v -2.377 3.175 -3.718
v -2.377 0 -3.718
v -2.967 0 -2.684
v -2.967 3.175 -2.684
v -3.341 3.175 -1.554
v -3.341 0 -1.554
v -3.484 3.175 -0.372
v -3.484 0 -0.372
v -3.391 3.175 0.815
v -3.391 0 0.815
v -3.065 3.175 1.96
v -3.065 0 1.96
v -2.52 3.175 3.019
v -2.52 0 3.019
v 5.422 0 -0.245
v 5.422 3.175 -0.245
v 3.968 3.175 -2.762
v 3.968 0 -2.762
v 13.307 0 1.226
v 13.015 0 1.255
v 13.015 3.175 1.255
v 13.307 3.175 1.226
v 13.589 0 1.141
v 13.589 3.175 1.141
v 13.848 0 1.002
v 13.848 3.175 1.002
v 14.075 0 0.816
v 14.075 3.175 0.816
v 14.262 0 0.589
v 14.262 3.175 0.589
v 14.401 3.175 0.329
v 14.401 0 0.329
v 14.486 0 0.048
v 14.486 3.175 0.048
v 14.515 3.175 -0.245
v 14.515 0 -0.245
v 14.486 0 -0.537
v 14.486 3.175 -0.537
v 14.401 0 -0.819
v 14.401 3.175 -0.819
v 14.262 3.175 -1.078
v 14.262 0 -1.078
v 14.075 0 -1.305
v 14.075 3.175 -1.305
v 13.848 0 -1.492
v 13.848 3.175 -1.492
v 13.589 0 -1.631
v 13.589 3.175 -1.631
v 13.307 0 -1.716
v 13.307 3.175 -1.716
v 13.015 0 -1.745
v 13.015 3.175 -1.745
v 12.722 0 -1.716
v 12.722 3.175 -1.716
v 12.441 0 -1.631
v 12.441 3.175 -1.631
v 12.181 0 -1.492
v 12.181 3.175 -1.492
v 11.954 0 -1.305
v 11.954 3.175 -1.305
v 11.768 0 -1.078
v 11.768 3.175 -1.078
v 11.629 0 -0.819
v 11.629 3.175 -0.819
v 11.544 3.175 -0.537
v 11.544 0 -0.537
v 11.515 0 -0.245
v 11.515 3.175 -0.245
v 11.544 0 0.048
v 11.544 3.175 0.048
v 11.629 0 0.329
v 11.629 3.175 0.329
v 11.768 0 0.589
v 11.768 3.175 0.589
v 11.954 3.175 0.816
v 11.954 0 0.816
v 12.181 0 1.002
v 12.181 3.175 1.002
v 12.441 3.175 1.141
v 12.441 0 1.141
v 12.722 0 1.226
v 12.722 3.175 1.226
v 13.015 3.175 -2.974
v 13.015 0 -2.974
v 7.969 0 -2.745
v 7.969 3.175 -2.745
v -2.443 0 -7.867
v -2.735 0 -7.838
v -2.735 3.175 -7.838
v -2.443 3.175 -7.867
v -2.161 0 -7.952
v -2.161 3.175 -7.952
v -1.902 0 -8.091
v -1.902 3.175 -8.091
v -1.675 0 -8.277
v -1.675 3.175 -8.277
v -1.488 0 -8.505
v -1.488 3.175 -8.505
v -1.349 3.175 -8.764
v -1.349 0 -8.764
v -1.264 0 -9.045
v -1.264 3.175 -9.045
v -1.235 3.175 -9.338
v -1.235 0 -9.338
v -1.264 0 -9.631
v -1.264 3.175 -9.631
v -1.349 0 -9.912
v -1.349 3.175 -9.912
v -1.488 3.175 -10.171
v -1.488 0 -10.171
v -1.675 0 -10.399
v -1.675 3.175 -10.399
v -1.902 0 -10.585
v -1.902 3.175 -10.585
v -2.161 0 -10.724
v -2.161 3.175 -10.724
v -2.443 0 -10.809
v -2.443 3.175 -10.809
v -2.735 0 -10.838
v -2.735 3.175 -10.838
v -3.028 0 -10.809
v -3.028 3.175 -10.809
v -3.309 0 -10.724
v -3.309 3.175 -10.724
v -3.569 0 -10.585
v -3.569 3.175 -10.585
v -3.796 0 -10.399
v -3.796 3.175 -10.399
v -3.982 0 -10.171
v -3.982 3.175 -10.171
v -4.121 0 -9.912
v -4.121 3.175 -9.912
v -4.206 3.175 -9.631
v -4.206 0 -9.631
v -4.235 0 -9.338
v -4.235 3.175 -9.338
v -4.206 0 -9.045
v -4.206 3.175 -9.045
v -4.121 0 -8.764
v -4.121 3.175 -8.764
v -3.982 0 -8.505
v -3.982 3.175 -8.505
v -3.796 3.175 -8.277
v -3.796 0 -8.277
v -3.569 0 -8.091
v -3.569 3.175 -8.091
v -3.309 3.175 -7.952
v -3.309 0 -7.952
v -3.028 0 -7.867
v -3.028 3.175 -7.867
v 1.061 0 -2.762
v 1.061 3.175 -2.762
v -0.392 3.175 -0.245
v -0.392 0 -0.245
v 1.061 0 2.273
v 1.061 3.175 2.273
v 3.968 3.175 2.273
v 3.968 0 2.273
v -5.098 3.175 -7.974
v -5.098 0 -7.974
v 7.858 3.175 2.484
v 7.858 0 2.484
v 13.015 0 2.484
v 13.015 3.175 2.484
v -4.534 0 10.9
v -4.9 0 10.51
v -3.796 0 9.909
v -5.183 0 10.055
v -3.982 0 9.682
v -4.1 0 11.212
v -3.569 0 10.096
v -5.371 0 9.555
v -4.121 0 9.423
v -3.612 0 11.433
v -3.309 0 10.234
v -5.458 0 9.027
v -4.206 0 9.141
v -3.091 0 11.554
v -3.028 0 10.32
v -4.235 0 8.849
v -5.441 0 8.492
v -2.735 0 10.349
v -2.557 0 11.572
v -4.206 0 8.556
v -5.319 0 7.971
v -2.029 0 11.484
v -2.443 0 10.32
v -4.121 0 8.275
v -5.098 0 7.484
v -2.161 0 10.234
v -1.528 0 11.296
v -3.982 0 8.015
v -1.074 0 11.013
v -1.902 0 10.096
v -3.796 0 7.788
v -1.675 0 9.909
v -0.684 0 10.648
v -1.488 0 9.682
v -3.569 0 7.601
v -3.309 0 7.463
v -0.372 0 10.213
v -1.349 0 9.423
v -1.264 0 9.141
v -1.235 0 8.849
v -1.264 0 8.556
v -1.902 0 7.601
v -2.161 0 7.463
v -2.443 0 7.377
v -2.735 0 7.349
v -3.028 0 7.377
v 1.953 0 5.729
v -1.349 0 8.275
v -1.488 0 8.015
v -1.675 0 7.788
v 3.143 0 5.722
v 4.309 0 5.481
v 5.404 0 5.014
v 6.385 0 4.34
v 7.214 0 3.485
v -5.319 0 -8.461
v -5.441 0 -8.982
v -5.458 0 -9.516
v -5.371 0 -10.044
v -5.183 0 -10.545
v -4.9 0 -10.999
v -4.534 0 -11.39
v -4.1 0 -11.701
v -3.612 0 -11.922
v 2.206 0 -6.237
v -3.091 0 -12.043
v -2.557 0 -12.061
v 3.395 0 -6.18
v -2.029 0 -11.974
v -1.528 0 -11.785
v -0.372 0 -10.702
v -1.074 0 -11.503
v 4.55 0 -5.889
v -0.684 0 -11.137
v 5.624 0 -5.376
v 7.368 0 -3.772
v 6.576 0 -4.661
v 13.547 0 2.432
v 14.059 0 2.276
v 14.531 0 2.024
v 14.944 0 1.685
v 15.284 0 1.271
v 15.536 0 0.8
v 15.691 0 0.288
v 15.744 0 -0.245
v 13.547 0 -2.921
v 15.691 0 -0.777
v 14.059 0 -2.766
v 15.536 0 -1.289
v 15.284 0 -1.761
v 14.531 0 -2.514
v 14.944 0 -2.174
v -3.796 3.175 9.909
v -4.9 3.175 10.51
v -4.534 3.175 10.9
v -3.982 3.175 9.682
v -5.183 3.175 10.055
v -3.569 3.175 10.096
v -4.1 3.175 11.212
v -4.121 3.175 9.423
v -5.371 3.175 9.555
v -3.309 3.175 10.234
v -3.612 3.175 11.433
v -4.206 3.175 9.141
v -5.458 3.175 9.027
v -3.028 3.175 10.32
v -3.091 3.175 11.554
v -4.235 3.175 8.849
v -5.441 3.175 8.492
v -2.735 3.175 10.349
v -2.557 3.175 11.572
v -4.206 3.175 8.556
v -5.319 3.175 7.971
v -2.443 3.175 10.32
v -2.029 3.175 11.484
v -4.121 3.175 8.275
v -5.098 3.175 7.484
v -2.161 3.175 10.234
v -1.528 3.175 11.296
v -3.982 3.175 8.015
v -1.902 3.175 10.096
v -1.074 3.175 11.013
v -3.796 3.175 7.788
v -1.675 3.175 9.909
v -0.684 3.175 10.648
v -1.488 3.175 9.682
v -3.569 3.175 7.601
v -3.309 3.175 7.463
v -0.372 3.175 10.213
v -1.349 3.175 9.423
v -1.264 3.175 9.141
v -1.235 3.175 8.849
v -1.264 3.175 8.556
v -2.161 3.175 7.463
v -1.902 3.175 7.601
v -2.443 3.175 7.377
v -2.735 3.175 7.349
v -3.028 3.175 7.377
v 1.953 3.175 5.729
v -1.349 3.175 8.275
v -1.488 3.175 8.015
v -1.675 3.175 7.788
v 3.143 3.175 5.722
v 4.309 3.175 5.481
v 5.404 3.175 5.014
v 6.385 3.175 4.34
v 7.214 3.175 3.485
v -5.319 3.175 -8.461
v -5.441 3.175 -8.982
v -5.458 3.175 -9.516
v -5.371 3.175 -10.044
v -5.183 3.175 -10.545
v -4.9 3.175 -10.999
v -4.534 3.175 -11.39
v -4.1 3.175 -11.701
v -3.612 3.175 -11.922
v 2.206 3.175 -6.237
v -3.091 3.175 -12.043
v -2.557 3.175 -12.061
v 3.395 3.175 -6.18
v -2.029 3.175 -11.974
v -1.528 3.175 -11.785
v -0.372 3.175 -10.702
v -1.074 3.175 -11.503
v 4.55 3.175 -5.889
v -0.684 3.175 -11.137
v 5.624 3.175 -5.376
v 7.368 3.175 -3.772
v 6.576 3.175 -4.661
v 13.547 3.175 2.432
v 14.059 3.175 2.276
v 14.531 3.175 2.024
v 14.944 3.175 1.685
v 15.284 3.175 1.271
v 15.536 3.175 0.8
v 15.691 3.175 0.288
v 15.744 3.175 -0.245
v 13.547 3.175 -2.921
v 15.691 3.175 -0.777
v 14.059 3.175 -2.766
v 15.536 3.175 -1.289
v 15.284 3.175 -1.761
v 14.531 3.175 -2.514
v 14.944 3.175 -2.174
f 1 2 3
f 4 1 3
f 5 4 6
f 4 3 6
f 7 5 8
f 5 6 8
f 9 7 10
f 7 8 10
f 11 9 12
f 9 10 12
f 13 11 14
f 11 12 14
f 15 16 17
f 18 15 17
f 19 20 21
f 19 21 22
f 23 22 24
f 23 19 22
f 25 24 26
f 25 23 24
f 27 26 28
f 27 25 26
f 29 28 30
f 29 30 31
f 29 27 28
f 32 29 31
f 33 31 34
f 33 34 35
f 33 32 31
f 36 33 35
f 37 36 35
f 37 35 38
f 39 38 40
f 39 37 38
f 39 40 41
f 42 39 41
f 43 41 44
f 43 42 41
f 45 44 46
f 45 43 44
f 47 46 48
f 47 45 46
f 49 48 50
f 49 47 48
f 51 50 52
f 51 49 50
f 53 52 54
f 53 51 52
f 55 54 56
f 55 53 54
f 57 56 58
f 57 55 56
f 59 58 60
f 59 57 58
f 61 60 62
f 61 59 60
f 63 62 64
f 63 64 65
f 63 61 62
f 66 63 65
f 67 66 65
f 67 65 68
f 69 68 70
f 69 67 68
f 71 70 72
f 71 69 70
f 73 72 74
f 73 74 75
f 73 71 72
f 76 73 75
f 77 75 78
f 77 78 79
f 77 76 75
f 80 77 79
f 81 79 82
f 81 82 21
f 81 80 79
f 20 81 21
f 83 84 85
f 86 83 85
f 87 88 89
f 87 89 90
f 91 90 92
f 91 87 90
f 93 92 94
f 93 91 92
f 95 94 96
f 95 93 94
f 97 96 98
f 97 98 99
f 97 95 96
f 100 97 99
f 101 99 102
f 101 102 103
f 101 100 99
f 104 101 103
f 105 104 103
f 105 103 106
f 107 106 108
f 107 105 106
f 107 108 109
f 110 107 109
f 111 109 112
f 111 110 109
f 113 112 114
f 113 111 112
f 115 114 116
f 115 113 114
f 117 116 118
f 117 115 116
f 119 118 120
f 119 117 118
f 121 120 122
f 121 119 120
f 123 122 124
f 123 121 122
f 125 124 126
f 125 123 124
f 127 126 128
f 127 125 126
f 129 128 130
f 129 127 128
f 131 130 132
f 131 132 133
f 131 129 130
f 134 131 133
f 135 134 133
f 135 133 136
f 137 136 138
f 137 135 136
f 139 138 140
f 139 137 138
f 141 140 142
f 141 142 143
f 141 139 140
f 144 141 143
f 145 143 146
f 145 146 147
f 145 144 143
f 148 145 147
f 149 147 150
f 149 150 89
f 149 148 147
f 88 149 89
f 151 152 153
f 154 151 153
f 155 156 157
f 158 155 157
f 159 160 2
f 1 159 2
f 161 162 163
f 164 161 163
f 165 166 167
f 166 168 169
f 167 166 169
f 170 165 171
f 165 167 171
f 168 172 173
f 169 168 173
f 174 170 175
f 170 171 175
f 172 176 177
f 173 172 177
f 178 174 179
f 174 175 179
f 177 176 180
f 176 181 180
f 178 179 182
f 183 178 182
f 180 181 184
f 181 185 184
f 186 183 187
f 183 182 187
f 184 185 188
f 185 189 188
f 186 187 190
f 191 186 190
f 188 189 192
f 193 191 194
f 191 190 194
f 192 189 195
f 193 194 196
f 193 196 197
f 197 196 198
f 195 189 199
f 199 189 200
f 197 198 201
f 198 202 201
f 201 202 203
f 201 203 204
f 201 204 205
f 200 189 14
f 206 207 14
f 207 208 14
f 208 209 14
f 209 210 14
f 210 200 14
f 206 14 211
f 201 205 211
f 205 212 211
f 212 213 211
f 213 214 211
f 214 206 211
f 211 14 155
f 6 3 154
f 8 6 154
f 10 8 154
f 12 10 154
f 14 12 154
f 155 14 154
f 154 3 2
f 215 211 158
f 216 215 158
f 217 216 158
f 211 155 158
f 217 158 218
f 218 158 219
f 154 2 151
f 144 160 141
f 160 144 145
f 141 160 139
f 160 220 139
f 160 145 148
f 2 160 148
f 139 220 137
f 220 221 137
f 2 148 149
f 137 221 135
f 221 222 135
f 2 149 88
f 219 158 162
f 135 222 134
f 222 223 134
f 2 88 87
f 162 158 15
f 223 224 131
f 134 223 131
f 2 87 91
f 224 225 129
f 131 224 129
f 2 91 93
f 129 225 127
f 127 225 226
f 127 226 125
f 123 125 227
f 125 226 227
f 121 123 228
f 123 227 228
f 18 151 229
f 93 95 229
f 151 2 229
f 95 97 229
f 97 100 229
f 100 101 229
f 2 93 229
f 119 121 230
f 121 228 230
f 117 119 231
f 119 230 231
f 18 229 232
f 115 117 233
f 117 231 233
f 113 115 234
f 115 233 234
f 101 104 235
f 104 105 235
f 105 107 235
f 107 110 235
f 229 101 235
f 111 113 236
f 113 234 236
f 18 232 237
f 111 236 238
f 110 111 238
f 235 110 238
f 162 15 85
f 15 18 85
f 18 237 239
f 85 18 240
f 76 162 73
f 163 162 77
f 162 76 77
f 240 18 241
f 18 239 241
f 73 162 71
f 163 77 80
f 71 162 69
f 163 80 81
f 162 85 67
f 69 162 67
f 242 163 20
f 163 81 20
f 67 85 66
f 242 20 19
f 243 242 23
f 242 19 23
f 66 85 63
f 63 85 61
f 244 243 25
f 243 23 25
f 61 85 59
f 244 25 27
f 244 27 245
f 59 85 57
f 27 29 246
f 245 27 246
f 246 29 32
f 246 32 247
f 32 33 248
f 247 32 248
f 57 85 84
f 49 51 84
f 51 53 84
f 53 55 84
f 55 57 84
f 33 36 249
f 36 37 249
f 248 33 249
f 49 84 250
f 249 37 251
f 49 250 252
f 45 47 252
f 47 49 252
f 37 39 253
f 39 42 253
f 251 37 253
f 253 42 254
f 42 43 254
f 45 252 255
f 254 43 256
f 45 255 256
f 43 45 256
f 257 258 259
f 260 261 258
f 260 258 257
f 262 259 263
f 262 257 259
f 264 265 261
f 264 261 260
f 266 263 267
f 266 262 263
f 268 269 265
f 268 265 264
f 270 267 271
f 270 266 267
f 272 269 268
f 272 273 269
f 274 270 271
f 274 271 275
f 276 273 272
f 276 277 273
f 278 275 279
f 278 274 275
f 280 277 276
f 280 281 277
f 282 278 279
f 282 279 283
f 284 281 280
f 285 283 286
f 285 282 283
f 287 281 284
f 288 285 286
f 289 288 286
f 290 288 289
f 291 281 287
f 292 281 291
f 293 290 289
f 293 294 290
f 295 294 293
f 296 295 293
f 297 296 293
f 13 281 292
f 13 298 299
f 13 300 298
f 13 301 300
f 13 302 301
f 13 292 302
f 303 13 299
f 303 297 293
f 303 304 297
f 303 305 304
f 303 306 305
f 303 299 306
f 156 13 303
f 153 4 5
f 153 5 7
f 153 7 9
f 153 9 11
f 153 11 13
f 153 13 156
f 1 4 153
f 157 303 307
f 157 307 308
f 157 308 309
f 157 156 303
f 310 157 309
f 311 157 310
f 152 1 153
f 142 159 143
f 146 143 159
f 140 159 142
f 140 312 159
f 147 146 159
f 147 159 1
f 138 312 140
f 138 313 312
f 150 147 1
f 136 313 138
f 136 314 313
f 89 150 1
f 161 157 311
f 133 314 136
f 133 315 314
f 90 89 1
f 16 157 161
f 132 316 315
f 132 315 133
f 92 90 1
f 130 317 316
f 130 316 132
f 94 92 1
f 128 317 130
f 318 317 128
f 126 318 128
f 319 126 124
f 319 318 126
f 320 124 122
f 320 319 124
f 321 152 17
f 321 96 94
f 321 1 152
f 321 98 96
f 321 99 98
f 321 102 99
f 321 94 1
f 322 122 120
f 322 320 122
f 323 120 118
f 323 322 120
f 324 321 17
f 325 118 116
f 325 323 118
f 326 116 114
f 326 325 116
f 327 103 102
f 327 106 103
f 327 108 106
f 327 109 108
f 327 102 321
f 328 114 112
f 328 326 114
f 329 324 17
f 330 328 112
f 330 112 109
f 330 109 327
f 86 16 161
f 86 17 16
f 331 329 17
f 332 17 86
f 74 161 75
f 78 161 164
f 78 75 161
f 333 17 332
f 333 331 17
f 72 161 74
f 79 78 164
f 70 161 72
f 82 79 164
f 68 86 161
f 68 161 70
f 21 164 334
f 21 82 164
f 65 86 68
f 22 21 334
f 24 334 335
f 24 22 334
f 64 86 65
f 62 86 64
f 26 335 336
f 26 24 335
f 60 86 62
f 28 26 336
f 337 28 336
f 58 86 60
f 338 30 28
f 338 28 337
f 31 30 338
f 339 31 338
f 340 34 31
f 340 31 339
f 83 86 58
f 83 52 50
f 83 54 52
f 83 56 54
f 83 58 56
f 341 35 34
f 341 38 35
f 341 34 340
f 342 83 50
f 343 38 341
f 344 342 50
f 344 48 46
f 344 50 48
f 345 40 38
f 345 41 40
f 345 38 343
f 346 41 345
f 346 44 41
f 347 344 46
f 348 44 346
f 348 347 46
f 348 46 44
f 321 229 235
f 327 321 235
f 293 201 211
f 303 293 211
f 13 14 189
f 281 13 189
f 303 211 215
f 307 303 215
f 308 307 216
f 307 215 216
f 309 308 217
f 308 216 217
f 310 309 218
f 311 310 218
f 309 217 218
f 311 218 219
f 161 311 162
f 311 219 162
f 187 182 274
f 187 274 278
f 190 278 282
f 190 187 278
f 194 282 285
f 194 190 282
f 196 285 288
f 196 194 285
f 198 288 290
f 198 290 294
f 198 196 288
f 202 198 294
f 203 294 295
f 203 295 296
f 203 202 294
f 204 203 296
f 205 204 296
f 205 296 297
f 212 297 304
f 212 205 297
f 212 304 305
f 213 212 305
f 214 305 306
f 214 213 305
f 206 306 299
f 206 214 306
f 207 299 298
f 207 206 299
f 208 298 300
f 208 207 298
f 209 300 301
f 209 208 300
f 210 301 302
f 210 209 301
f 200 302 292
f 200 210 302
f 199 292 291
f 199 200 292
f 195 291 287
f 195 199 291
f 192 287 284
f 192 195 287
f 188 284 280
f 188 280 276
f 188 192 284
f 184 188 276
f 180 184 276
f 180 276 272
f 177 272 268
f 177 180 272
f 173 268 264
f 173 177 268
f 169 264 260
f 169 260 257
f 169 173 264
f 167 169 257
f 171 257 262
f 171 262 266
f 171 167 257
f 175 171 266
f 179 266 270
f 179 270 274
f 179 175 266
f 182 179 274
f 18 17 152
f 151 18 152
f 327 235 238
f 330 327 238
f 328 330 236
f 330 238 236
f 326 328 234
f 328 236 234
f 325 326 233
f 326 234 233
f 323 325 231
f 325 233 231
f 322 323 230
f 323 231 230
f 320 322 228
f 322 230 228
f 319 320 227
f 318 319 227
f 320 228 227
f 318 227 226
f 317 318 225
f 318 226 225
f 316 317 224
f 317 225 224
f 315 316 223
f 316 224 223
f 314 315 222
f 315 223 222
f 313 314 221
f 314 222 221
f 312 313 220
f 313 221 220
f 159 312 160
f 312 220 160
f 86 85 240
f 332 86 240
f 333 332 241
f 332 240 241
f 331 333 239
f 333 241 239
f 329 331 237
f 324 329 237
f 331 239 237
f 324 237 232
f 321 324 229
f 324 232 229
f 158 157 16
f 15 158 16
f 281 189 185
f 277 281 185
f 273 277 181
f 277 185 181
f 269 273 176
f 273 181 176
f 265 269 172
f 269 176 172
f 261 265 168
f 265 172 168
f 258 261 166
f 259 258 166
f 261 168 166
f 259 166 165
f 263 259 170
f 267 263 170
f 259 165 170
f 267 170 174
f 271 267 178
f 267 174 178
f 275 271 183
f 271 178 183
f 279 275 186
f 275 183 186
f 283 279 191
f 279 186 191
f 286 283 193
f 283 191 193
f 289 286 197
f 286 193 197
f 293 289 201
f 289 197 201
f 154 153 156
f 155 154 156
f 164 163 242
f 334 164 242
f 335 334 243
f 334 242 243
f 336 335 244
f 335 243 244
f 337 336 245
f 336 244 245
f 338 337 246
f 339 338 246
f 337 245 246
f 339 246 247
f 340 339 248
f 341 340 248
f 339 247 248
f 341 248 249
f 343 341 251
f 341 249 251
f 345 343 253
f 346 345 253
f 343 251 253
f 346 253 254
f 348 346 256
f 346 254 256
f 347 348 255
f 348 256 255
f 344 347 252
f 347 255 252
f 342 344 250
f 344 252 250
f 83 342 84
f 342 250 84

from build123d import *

# Parameters (mm, degrees)
SKETCH1_R           = 1.5
BOSS_EXTRUDE1_DEPTH = 3.175
CUT_EXTRUDE1_DEPTH  = 10


with BuildPart() as part:
    # Sketch1 → Boss-Extrude1 (new body)
    with BuildSketch(Plane(origin=(0, 0, 0), x_dir=(1, 0, 0), z_dir=(0, 1, 0))):
        with BuildLine():
            Line((7.858300919, -2.484134681), (13.014762042, -2.484134681))
            ThreePointArc((13.014762042, -2.484134681), (15.743606535, 0.244709812), (13.014762042, 2.973554305))
            Line((13.014762042, 2.973554305), (7.969118099, 2.744709812))
            ThreePointArc((7.969118099, 2.744709812), (5.624188125, 5.376129638), (2.206241257, 6.236772472))
            Line((2.206241257, 6.236772472), (-0.371989304, 10.702398798))
            ThreePointArc((-0.371989304, 10.702398798), (-4.099660205, 11.701225206), (-5.098486612, 7.973554305))
            Line((-5.098486612, 7.973554305), (-2.377479496, 3.718320719))
            ThreePointArc((-2.377479496, 3.718320719), (-3.483890927, 0.371841879), (-2.520256051, -3.018508355))
            Line((-2.520256051, -3.018508355), (-5.098486612, -7.484134681))
            ThreePointArc((-5.098486612, -7.484134681), (-4.099660205, -11.211805582), (-0.371989304, -10.212979174))
            Line((-0.371989304, -10.212979174), (1.952647522, -5.728901095))
            ThreePointArc((1.952647522, -5.728901095), (5.403988927, -5.013842081), (7.858300919, -2.484134681))
        make_face()
        Polygon((3.965354593, 2.757209812), (5.415947144, 0.244709812), (3.965354593, -2.267790188), (1.06416949, -2.267790188), (-0.386423061, 0.244709812), (1.06416949, 2.757209812), align=None, mode=Mode.SUBTRACT)
        with Locations(Location((13.014762042, 0.244709812, 0), (0, 0, 270))):
            Circle(SKETCH1_R, mode=Mode.SUBTRACT)
        with Locations(Location((-2.735237958, 9.337976552, 0), (0, 0, 270))):
            Circle(SKETCH1_R, mode=Mode.SUBTRACT)
        with Locations(Location((-2.735237958, -8.848556928, 0), (0, 0, 270))):
            Circle(SKETCH1_R, mode=Mode.SUBTRACT)
    extrude(amount=BOSS_EXTRUDE1_DEPTH)

    # Sketch2 → Cut-Extrude1 (cut)
    with BuildSketch(Plane(origin=(0, 3.175, 0), x_dir=(1, 0, 0), z_dir=(0, 1, 0))):
        Polygon((5.421720647, 0.244709812), (3.968241344, 2.762209812), (1.061282739, 2.762209812), (-0.392196564, 0.244709812), (1.061282739, -2.272790188), (3.968241344, -2.272790188), align=None)
    extrude(amount=-CUT_EXTRUDE1_DEPTH, mode=Mode.SUBTRACT)


solid = part.part
